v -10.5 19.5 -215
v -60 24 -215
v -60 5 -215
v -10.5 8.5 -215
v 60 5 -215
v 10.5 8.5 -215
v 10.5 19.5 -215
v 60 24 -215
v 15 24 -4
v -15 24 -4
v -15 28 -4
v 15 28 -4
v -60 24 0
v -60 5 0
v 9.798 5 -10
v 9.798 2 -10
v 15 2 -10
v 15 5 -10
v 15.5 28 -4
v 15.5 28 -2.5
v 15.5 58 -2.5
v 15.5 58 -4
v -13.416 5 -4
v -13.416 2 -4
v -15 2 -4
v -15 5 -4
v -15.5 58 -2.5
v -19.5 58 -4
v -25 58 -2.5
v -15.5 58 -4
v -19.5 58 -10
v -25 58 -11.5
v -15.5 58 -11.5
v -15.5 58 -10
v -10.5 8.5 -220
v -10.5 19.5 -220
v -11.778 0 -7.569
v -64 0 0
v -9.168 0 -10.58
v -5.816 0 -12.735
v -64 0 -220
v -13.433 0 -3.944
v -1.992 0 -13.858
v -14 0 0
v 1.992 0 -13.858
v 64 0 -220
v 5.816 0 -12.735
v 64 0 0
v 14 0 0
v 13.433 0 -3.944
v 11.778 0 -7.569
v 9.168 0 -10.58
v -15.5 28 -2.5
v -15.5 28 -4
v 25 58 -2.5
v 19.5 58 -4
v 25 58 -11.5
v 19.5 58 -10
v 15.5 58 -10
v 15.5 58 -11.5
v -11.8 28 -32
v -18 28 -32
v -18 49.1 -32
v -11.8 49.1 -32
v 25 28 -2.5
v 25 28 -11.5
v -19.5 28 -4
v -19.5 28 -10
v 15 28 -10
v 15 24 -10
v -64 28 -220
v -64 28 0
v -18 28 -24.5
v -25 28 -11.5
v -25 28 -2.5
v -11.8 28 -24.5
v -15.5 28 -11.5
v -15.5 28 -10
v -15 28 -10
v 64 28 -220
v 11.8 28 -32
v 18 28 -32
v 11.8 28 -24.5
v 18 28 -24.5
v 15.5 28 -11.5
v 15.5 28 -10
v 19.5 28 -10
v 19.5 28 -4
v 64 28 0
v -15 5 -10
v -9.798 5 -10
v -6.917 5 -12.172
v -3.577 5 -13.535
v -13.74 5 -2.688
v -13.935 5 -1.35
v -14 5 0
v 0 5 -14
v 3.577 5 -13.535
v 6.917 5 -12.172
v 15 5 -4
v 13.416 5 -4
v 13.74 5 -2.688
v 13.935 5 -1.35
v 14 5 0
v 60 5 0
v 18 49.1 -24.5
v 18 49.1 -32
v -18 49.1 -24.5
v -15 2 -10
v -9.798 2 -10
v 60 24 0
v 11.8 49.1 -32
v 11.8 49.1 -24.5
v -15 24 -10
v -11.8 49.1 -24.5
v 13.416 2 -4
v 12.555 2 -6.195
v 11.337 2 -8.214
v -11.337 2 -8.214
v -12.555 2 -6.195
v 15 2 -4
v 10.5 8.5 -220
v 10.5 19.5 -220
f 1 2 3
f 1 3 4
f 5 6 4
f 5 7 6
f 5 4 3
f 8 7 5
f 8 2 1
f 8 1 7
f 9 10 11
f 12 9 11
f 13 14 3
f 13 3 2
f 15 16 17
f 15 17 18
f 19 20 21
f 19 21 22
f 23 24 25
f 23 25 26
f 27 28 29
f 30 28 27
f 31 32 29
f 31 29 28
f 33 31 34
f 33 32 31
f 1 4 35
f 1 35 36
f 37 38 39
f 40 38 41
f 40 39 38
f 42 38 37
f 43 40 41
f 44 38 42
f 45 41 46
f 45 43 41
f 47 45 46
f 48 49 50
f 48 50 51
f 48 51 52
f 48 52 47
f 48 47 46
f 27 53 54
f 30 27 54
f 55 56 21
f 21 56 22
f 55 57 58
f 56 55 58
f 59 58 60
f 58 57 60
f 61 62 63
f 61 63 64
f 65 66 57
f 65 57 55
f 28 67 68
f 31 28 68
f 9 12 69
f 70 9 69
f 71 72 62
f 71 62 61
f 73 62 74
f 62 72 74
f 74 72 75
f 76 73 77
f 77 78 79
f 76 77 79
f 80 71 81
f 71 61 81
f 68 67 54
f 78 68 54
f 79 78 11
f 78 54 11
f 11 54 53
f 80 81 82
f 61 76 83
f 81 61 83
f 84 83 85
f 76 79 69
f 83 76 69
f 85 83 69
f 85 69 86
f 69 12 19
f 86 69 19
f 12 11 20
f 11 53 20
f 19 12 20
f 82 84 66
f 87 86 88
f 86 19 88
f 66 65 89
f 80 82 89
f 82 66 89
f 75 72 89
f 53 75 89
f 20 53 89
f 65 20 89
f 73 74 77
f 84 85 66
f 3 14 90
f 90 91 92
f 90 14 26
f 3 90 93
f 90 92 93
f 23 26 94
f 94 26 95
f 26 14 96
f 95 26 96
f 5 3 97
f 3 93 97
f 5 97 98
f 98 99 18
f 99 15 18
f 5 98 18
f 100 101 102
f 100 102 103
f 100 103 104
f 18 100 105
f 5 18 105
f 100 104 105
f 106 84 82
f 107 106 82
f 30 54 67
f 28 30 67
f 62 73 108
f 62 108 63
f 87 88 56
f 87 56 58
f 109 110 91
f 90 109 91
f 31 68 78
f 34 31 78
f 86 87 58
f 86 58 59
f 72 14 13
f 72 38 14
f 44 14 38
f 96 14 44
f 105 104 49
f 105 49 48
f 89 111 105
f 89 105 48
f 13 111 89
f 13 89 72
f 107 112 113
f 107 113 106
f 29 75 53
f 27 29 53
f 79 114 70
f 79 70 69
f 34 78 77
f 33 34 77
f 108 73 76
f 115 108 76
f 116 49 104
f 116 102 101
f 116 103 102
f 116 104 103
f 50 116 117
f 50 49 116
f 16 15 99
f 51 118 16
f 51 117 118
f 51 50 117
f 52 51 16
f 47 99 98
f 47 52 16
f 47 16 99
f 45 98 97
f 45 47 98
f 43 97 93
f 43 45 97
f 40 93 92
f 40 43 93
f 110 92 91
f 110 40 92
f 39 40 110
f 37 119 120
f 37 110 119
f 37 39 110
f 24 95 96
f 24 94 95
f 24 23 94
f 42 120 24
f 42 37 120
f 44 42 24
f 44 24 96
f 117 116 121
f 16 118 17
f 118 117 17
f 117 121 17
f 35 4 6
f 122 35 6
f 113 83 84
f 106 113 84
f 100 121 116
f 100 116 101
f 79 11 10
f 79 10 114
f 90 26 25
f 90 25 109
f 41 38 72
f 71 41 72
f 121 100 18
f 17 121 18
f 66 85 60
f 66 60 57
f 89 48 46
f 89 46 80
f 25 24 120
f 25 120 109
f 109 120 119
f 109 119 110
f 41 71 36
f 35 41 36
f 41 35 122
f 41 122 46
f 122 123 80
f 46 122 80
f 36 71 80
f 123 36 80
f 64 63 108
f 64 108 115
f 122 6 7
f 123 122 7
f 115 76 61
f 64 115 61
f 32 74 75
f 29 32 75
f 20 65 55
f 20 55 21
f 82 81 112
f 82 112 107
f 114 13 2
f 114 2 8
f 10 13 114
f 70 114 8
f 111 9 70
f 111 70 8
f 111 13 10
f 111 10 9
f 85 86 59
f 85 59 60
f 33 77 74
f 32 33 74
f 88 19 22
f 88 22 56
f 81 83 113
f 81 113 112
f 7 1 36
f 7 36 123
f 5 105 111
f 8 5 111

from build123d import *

# Parameters (mm, degrees)
ESQUISSE1_W                   = 128
ESQUISSE1_H                   = 28
ESQUISSE1_W_2                 = 120
ESQUISSE1_H_2                 = 19
CORPS_CASIER_DEPTH            = 220
PAROI_FOND_START              = -215
ESQUISSE2_W                   = 120
ESQUISSE2_H                   = 19
ESQUISSE2_W_2                 = 21
ESQUISSE2_H_2                 = 11
PAROI_FOND_DEPTH              = 5
ESQUISSE3_W                   = 6
ESQUISSE3_H                   = 6
ESQUISSE3_H_2                 = 4
FENTE_ET_ENCOCHE_VERROU_DEPTH = 15
ESQUISSE4_R                   = 14
ENCOCHE_PRISE_DOIGT_DEPTH     = 6
GLISSIERES_VERROU_START       = 28
GLISSIERES_VERROU_DEPTH       = 30
SUPPORTS_SERVO_SG90_START     = 28
ESQUISSE6_W                   = 6.2
ESQUISSE6_H                   = 7.5
SUPPORTS_SERVO_SG90_DEPTH     = 21.1


with BuildPart() as part:
    # Esquisse1 → Corps_casier (new body)
    with BuildSketch(Plane.XY):
        with Locations((0, 14)):
            Rectangle(ESQUISSE1_W, ESQUISSE1_H)
        with Locations((0, 14.5)):
            Rectangle(ESQUISSE1_W_2, ESQUISSE1_H_2, mode=Mode.SUBTRACT)
    extrude(amount=-CORPS_CASIER_DEPTH)

    # Esquisse2 → Paroi_fond (add)
    with BuildSketch(Plane.XY.offset(PAROI_FOND_START)):
        with Locations((0, 14.5)):
            Rectangle(ESQUISSE2_W, ESQUISSE2_H)
        with Locations((0, 14)):
            Rectangle(ESQUISSE2_W_2, ESQUISSE2_H_2, mode=Mode.SUBTRACT)
    extrude(amount=-PAROI_FOND_DEPTH)

    # Esquisse3 → Fente_et_encoche_verrou (cut, symmetric)
    with BuildSketch(Plane(origin=(0, 0, 0), x_dir=(0, 0, -1), z_dir=(1, 0, 0))):
        with Locations((7, 26)):
            Rectangle(ESQUISSE3_W, ESQUISSE3_H)
        with Locations((7, 4)):
            Rectangle(ESQUISSE3_W, ESQUISSE3_H_2)
    extrude(amount=FENTE_ET_ENCOCHE_VERROU_DEPTH, both=True, mode=Mode.SUBTRACT)

    # Esquisse4 → Encoche_prise_doigt (cut)
    with BuildSketch(Plane(origin=(0, 0, 0), x_dir=(1, 0, 0), z_dir=(0, 1, 0))):
        Circle(ESQUISSE4_R)
    extrude(amount=ENCOCHE_PRISE_DOIGT_DEPTH, mode=Mode.SUBTRACT)

    # Esquisse5 → Glissieres_verrou (add)
    with BuildSketch(Plane(origin=(0, 0, 0), x_dir=(1, 0, 0), z_dir=(0, 1, 0)).offset(GLISSIERES_VERROU_START)):
        Polygon((-25, 2.5), (-15.5, 2.5), (-15.5, 4), (-19.5, 4), (-19.5, 10), (-15.5, 10), (-15.5, 11.5), (-25, 11.5), align=None)
        Polygon((25, 2.5), (15.5, 2.5), (15.5, 4), (19.5, 4), (19.5, 10), (15.5, 10), (15.5, 11.5), (25, 11.5), align=None)
    extrude(amount=GLISSIERES_VERROU_DEPTH)

    # Esquisse6 → Supports_servo_SG90 (add)
    with BuildSketch(Plane(origin=(0, 0, 0), x_dir=(1, 0, 0), z_dir=(0, 1, 0)).offset(SUPPORTS_SERVO_SG90_START)):
        with Locations((-14.9, 28.25)):
            Rectangle(ESQUISSE6_W, ESQUISSE6_H)
        with Locations((14.9, 28.25)):
            Rectangle(ESQUISSE6_W, ESQUISSE6_H)
    extrude(amount=SUPPORTS_SERVO_SG90_DEPTH)


solid = part.part
